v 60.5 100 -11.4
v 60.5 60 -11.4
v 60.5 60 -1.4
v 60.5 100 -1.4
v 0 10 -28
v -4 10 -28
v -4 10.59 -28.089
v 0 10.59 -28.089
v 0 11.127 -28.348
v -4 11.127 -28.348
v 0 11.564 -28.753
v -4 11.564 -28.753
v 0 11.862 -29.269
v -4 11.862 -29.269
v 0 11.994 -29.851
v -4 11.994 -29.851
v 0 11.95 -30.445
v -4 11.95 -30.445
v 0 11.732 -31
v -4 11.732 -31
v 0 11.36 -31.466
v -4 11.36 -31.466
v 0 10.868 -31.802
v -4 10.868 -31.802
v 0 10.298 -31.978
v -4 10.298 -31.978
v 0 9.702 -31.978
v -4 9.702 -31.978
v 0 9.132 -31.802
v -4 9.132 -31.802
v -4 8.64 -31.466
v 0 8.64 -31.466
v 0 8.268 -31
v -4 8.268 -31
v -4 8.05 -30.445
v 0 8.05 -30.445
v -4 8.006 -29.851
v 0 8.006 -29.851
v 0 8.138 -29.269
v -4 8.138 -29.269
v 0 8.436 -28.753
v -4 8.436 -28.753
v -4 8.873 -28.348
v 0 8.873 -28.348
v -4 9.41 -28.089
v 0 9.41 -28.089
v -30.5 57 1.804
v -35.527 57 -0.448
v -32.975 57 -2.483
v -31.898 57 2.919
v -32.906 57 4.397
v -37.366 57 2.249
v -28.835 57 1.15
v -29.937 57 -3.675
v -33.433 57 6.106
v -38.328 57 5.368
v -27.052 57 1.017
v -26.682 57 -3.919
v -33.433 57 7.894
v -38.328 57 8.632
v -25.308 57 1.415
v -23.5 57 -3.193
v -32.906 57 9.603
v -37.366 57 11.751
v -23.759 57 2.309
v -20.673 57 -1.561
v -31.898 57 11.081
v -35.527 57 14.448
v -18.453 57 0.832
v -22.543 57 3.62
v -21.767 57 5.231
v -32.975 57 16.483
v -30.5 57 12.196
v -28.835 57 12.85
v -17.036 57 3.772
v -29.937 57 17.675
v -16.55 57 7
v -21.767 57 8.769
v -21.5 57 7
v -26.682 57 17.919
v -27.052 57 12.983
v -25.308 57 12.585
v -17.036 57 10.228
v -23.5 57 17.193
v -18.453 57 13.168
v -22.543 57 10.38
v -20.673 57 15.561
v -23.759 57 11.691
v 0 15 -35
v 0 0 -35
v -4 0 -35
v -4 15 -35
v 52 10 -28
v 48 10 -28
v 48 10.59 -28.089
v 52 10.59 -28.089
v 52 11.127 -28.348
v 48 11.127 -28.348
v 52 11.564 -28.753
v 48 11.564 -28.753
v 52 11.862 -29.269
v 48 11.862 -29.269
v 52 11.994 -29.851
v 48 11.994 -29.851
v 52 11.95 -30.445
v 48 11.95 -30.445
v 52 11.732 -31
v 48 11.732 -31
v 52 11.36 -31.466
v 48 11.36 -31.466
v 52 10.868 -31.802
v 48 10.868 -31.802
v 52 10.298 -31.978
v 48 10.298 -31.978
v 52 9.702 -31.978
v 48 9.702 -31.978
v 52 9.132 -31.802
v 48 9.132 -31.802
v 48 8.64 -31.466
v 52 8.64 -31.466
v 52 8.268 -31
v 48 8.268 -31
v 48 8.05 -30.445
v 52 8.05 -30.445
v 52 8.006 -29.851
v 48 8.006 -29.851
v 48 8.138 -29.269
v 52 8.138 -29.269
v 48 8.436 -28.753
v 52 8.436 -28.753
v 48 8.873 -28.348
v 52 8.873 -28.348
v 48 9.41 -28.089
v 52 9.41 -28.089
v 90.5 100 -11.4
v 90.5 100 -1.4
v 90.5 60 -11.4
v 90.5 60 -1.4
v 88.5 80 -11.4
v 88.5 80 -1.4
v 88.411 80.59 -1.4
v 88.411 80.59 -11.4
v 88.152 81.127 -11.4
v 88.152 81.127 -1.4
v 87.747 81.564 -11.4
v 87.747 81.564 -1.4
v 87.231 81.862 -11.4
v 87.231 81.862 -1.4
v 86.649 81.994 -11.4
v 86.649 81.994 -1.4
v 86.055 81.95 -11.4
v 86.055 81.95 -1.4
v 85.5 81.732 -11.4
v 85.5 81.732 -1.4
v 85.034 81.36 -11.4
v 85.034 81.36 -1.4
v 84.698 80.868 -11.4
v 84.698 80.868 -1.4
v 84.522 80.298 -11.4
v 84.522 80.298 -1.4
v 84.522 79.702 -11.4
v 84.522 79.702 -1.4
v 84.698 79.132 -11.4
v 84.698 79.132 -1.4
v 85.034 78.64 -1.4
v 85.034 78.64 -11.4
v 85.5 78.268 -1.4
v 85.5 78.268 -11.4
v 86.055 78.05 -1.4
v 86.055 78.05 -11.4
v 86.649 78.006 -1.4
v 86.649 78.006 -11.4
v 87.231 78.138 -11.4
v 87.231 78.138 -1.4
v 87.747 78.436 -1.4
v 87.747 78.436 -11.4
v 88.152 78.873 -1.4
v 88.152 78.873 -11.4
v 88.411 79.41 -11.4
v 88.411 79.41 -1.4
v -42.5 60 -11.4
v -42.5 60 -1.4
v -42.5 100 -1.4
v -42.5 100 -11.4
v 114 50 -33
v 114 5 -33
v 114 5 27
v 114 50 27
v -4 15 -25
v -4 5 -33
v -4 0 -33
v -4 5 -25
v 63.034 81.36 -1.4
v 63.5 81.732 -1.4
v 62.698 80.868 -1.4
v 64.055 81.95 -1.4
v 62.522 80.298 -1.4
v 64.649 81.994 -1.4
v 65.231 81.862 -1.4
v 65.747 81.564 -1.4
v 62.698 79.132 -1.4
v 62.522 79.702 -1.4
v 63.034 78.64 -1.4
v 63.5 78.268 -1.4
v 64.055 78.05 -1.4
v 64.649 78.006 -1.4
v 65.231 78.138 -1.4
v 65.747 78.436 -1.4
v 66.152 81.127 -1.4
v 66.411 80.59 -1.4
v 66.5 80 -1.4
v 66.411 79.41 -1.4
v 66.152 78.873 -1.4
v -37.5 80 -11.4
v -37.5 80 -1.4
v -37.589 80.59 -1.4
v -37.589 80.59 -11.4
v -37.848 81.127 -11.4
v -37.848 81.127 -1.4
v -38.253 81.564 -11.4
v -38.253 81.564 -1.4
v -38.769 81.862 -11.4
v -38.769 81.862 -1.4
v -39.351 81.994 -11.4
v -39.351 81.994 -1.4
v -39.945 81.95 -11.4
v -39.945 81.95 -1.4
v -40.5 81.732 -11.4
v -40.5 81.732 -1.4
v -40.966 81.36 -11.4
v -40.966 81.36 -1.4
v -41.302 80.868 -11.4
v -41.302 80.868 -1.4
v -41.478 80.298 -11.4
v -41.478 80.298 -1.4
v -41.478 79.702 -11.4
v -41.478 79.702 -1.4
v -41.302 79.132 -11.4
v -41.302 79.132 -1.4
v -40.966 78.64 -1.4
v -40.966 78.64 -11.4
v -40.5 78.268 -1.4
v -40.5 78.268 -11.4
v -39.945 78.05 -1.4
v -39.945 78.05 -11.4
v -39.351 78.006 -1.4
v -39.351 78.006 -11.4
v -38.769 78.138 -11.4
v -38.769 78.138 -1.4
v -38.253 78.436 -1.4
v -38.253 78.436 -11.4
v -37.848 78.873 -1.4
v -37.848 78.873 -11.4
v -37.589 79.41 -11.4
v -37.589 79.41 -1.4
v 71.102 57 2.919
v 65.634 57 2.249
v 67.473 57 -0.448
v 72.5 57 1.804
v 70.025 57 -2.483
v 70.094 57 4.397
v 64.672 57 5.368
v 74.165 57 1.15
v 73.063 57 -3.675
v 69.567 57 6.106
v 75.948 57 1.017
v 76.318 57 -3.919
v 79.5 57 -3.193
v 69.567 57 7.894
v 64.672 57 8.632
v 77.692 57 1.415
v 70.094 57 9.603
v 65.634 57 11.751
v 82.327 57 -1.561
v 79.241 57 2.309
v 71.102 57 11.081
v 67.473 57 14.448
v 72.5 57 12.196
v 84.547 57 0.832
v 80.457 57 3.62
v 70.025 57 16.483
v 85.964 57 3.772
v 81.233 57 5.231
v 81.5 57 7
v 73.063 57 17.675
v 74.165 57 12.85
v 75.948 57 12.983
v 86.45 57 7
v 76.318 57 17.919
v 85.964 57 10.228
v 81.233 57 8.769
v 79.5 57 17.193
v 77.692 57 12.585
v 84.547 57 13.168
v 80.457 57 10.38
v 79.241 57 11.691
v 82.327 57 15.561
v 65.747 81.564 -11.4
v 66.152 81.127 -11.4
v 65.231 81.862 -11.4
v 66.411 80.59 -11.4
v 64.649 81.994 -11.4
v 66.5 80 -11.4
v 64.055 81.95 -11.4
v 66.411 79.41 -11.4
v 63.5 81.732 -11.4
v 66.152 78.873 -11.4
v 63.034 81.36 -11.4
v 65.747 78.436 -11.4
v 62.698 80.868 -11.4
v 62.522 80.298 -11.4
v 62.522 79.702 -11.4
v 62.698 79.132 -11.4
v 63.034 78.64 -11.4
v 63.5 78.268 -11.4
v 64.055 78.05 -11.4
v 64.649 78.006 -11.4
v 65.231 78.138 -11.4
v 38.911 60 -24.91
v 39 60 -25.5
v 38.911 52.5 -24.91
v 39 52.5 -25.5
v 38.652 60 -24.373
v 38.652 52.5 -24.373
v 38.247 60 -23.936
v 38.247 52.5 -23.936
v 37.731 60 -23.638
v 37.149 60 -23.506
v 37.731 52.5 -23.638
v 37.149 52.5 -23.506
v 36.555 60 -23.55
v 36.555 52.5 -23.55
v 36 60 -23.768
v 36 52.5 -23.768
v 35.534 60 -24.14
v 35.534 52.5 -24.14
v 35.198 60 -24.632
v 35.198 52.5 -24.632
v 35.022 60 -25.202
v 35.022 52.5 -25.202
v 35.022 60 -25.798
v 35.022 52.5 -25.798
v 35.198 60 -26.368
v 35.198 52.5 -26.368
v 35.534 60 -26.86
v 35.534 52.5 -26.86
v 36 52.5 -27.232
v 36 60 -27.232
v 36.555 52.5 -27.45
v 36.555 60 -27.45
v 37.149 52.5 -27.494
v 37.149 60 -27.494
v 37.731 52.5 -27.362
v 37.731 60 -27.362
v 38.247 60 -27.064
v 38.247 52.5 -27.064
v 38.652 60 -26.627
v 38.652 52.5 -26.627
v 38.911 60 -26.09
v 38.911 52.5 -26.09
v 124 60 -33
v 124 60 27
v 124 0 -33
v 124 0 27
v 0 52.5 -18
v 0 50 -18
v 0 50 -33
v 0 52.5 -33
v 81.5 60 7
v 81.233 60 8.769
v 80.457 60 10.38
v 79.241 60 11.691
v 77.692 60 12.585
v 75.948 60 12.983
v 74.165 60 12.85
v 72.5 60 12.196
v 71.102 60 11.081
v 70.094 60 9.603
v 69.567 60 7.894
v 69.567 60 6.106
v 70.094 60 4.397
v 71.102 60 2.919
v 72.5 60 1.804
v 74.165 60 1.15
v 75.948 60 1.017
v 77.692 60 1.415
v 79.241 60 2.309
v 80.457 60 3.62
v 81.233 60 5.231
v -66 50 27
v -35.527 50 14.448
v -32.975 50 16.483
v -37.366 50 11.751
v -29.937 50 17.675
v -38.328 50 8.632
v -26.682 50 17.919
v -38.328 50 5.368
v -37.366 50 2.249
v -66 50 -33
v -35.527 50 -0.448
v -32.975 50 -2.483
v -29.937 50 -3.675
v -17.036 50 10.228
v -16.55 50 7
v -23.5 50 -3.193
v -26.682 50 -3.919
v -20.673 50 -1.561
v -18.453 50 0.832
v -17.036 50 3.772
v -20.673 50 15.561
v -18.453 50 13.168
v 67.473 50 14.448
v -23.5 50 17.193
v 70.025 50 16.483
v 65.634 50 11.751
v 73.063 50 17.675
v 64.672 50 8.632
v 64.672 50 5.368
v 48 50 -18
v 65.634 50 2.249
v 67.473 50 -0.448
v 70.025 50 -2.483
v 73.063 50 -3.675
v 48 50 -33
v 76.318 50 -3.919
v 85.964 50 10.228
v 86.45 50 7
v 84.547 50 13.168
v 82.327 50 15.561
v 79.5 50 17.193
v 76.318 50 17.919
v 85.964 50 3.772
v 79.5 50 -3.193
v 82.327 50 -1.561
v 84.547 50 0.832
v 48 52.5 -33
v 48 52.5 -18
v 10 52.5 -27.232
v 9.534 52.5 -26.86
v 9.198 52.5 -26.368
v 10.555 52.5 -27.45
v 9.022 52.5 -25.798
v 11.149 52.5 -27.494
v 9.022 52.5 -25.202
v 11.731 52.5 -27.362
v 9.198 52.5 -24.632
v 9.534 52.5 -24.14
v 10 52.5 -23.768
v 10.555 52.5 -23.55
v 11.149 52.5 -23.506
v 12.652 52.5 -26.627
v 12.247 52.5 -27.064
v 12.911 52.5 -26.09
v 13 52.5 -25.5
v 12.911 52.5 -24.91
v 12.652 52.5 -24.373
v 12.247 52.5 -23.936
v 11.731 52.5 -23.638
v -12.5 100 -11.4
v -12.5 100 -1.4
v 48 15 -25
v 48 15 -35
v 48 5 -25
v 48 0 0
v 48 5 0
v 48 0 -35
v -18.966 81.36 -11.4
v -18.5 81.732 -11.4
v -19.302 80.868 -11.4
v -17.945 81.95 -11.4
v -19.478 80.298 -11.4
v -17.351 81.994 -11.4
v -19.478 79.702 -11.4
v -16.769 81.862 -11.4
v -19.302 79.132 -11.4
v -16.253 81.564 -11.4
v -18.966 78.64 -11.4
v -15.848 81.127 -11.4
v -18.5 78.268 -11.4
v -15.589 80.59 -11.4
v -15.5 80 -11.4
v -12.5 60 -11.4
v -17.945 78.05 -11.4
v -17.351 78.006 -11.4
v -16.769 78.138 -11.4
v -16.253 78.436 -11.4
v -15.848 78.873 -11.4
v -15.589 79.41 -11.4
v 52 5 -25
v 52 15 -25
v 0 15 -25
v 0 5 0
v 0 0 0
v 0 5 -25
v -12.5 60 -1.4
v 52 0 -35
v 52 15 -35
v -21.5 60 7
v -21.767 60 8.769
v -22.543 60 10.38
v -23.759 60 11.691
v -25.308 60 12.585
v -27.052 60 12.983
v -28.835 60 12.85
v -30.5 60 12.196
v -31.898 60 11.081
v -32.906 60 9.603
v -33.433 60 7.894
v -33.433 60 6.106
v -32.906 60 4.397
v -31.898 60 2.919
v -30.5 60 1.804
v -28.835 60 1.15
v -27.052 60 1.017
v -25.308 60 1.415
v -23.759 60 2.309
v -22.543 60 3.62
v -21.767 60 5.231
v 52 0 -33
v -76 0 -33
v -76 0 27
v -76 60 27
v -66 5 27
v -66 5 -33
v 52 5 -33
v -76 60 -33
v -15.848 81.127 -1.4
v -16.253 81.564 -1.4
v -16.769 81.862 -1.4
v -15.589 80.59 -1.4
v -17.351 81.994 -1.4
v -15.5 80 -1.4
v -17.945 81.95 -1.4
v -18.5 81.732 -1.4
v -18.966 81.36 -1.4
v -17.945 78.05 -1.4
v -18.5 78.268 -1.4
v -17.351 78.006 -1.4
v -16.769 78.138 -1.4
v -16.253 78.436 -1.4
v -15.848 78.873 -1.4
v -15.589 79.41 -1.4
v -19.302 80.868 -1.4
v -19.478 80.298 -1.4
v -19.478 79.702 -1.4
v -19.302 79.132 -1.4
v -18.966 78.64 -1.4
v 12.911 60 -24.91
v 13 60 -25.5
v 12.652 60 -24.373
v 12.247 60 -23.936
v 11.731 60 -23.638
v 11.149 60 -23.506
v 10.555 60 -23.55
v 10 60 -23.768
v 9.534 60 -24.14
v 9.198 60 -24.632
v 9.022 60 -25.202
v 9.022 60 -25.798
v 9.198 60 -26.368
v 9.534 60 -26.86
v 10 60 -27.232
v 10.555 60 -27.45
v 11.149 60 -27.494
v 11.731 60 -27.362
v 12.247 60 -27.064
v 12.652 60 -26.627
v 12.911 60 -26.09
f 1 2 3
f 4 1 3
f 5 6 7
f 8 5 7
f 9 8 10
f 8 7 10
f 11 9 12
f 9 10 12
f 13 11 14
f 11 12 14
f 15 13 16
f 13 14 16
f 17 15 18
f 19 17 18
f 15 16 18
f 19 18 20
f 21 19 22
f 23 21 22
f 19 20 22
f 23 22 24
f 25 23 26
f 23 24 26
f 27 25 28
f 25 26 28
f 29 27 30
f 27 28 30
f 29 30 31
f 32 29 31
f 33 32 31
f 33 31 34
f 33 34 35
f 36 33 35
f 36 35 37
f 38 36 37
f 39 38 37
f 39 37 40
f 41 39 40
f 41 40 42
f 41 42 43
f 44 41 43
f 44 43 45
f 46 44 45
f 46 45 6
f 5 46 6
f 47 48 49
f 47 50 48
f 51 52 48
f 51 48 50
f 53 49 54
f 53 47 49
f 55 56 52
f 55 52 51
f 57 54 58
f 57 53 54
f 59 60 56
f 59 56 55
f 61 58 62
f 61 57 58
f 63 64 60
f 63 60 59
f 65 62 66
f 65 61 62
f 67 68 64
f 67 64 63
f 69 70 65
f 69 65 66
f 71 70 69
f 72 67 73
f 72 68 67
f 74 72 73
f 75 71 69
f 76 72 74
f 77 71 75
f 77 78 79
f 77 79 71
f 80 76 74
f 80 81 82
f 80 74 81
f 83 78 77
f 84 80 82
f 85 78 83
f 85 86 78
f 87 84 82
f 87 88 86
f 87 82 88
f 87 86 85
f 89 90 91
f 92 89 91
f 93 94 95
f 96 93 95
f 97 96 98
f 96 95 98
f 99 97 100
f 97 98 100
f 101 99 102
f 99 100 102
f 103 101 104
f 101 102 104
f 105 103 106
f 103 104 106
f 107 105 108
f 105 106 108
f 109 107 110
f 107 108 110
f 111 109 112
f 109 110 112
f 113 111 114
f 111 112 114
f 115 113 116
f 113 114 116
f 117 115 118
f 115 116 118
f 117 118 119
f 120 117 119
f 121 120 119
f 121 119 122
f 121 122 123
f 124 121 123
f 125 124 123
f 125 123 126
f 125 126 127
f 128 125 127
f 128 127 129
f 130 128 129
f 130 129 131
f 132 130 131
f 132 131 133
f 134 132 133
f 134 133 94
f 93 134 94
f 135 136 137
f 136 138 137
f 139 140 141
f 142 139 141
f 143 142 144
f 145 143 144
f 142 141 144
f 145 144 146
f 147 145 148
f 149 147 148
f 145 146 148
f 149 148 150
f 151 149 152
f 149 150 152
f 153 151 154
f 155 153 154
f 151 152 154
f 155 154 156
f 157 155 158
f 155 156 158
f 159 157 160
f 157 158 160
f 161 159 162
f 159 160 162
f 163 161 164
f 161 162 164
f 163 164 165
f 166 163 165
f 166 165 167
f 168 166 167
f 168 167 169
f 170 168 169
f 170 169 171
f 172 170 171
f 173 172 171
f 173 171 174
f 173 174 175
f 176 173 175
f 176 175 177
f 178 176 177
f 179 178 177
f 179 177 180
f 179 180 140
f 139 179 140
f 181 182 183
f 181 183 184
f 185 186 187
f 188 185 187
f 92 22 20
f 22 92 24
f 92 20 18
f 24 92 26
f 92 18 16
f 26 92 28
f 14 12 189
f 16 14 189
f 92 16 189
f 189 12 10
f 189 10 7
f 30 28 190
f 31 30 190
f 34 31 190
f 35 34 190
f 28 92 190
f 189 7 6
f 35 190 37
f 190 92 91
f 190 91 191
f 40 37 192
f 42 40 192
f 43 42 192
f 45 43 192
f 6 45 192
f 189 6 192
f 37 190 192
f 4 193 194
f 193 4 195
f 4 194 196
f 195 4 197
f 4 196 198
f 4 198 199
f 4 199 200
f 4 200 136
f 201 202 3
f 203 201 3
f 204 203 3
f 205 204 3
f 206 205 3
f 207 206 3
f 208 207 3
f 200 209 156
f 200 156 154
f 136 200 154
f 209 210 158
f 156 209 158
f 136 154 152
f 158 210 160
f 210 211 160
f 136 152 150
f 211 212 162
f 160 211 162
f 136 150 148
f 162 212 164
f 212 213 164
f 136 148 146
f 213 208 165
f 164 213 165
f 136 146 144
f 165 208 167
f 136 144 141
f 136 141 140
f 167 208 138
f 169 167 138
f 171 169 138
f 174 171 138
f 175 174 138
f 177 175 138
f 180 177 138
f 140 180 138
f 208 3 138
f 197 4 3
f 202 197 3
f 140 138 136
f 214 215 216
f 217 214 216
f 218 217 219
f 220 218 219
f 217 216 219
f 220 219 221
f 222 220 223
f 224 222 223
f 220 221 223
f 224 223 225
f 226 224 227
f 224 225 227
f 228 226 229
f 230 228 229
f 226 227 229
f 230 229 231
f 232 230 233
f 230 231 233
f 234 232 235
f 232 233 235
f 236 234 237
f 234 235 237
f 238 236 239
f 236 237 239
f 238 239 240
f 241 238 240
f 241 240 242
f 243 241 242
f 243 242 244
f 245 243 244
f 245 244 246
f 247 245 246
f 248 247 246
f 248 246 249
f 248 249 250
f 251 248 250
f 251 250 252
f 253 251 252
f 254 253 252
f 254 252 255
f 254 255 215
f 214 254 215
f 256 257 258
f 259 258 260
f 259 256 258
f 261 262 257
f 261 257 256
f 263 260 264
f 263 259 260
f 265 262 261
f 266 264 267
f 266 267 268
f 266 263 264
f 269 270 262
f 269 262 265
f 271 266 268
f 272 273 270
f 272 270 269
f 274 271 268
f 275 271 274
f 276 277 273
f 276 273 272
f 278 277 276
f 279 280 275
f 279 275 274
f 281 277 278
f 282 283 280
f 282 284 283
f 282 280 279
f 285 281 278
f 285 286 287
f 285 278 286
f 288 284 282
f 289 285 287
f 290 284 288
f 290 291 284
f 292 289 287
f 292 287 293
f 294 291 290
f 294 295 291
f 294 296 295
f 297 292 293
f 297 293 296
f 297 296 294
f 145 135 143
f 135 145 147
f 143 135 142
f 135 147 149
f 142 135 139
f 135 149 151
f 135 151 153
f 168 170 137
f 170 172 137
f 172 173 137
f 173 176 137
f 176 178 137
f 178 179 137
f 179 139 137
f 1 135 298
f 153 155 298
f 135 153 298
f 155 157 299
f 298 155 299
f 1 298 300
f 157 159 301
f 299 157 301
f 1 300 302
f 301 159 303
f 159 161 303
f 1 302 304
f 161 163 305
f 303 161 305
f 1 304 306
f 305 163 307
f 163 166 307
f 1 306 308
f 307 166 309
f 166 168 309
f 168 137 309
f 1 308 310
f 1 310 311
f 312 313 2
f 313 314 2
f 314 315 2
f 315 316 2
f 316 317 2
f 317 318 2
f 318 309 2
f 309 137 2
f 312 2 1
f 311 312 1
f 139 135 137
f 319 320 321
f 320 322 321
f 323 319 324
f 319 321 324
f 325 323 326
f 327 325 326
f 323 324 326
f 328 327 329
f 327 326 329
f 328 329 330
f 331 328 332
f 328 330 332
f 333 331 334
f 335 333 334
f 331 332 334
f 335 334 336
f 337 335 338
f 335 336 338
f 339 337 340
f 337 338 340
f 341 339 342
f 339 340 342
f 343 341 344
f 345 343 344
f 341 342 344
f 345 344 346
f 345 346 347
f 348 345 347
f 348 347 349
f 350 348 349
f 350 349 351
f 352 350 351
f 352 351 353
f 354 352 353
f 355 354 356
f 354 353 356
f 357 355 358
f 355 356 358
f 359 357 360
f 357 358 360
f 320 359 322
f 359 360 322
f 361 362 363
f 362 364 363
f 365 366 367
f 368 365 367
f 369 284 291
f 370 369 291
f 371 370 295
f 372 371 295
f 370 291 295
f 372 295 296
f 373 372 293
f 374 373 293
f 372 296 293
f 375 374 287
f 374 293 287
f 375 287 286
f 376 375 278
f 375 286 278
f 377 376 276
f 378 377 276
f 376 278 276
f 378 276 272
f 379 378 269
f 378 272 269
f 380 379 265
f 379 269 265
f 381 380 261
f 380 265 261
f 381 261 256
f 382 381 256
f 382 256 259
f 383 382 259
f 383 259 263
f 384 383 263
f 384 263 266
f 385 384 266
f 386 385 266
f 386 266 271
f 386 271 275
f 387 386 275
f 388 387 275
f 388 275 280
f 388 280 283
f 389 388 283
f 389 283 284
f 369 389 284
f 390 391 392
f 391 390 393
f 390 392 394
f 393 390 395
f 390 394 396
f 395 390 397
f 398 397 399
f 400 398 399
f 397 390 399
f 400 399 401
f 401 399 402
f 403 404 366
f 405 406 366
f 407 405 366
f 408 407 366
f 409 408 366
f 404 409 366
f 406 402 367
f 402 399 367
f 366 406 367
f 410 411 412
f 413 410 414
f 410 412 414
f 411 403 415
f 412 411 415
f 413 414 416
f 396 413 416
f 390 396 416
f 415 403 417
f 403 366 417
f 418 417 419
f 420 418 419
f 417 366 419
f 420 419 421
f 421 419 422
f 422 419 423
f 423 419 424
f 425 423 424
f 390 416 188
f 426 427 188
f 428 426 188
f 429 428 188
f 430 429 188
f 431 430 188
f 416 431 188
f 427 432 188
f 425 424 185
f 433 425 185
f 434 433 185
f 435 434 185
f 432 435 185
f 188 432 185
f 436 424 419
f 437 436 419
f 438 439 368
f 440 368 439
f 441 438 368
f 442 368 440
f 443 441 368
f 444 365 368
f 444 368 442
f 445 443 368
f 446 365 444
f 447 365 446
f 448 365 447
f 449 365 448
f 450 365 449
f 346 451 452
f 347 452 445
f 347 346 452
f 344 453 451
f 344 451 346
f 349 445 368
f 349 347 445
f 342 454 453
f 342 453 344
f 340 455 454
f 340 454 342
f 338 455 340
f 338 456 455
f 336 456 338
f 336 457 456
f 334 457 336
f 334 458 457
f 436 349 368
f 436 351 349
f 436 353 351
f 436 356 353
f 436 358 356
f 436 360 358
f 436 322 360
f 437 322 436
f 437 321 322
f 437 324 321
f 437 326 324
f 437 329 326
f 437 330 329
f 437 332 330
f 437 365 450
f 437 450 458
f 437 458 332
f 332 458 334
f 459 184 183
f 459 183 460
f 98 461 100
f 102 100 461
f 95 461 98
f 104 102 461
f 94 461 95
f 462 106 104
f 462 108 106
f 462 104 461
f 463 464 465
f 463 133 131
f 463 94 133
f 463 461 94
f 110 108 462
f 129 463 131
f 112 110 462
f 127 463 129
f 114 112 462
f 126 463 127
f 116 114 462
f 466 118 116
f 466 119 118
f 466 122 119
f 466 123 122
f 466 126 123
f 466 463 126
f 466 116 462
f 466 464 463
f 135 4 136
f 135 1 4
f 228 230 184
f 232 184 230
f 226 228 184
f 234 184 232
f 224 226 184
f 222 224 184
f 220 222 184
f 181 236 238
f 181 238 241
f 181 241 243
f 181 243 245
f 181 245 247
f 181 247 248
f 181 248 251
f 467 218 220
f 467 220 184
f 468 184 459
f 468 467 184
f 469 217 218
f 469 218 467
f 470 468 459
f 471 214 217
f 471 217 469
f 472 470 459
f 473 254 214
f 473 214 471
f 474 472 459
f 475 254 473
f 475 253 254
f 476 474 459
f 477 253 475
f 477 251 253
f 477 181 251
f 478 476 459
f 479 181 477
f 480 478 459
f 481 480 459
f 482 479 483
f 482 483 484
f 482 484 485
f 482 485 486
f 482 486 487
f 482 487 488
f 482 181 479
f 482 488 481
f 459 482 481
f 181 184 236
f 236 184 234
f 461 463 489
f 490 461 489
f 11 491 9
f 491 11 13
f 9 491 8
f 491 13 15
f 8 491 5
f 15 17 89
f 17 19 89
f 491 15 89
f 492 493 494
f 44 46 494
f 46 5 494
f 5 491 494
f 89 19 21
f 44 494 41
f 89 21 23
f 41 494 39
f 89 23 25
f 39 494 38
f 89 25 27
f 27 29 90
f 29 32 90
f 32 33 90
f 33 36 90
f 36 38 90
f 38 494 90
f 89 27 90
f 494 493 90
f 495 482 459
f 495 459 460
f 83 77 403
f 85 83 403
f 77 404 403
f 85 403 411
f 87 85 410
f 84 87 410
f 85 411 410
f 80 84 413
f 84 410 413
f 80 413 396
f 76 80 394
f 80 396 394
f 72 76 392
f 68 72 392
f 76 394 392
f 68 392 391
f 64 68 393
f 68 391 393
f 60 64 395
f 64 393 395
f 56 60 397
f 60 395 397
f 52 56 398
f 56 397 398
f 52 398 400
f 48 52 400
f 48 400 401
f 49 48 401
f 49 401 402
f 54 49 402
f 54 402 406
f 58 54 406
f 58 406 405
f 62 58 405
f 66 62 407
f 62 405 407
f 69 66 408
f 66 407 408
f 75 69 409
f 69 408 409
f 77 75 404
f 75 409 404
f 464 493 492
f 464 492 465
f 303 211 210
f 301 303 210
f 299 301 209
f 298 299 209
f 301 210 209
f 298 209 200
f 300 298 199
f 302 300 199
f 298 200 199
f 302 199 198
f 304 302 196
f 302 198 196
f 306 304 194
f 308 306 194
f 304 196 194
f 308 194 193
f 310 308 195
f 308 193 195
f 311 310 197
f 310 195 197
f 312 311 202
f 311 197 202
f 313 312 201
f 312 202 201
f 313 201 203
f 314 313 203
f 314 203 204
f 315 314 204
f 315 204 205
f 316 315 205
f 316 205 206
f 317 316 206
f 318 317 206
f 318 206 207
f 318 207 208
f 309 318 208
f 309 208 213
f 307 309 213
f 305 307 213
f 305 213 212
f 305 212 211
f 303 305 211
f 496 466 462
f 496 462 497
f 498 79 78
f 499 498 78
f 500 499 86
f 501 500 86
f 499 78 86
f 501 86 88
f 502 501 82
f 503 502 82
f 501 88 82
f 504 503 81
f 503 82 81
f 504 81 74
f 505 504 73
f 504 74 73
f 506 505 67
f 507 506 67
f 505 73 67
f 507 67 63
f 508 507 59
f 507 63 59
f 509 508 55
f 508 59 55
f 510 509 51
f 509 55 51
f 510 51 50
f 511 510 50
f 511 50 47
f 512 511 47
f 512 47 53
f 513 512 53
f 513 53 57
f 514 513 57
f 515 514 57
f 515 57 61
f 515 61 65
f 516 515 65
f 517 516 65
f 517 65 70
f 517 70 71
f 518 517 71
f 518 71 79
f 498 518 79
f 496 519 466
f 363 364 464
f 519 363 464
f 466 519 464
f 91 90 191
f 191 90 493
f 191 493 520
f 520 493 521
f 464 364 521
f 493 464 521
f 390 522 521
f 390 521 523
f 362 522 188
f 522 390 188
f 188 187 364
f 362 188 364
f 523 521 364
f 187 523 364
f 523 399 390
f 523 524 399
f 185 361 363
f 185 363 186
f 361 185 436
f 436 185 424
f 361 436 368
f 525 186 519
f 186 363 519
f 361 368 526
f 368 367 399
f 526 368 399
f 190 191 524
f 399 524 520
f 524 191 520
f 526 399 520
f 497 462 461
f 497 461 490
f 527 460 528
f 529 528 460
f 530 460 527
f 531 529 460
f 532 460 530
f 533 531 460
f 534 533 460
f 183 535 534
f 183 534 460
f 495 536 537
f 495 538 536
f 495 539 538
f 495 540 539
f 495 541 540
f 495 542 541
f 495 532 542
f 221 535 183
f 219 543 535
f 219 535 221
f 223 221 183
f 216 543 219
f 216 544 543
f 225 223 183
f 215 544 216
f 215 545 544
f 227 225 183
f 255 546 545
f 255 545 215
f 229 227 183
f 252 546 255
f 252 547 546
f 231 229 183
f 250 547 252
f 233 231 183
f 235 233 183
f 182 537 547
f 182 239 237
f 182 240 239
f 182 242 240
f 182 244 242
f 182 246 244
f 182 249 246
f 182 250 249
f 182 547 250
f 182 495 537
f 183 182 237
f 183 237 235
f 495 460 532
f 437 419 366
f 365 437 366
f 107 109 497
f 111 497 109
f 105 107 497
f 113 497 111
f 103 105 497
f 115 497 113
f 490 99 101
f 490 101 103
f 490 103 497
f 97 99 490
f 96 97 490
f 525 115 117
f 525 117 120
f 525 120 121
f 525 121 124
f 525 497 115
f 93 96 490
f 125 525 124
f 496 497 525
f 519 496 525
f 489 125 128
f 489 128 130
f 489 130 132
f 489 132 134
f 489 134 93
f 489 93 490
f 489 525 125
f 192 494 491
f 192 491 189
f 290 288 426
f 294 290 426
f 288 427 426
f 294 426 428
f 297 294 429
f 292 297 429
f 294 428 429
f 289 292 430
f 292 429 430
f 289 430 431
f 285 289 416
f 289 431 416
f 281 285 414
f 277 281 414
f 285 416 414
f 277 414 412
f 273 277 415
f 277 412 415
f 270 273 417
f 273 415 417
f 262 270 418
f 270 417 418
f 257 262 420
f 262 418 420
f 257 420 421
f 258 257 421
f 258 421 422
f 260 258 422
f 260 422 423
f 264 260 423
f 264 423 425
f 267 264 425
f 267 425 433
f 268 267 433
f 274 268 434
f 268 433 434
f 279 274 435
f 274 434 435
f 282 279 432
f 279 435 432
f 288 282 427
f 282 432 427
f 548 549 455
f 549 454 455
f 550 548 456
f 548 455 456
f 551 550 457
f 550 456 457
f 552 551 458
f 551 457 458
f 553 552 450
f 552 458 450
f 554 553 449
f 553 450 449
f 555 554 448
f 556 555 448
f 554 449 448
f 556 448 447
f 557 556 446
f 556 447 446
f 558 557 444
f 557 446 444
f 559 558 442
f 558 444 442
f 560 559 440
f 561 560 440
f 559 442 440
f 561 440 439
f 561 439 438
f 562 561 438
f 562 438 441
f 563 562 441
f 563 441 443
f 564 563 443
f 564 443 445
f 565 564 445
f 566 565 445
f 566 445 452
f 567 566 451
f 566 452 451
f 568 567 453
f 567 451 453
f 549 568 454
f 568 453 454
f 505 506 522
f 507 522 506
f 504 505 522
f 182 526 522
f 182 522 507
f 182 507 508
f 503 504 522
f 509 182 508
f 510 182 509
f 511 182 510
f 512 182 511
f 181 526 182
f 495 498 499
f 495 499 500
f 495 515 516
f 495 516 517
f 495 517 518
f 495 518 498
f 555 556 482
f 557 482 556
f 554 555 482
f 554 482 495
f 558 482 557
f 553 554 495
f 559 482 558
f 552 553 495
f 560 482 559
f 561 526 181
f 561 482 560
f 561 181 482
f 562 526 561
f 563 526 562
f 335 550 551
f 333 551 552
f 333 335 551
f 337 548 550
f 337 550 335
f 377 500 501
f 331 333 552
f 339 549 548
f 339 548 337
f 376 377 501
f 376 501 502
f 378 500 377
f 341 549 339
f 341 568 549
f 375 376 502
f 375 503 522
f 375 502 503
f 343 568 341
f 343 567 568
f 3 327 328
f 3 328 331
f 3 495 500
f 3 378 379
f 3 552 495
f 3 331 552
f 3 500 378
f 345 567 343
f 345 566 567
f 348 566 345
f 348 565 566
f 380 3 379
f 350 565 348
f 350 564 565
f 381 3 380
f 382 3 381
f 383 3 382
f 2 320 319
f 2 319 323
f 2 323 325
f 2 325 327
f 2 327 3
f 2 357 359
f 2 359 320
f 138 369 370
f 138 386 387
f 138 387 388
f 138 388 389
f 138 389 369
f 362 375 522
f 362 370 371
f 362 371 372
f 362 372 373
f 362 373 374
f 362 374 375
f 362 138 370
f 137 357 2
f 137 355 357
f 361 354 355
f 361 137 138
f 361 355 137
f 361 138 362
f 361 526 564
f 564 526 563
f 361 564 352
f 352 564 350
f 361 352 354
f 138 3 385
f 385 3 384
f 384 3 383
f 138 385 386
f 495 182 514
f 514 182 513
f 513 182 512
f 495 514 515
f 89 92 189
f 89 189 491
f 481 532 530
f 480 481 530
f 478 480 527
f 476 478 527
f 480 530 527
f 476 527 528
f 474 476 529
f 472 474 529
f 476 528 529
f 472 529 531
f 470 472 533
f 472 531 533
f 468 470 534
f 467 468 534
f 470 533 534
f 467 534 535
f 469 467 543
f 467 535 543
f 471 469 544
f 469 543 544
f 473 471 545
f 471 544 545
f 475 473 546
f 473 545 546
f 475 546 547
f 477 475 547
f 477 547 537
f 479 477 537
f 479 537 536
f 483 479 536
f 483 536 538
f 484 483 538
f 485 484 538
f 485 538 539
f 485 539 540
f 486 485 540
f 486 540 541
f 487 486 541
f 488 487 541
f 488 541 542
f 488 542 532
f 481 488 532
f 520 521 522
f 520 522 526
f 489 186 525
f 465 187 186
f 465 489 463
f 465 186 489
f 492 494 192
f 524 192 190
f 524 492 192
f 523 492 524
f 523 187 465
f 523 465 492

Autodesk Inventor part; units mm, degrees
ref_plane "YZ Plane" through (0, 0, 0) normal (1, 0, 0) x (0, 1, 0)
ref_plane "XZ Plane" through (0, 0, 0) normal (0, 1, 0) x (-1, 0, 0)
ref_plane "XY Plane" through (0, 0, 0) normal (0, 0, 1) x (1, 0, 0)
sketch "Sketch1" plane through (0, 0, 0) normal (0, 1, 0) x (-1, 0, 0)
  line L0 (0, -35) -> (4, -35)
  line L1 (-48, 0) -> (-48, -35)
  line L2 (-48, -24.7754) -> (-48, -13.3333)
  line L3 (-48, -35) -> (-52, -35)
  line L4 (-52, -35) -> (-52, -33)
  line L5 (-52, -33) -> (-124, -33)
  line L6 (4, -35) -> (4, -33)
  line L7 (4, -33) -> (76, -33)
  line L8 (0, 0) -> (0, -35)
  line L9 (0, -96.6) -> (0, 47.6) projected
  line L10 (0, 0) -> (-48, 0)
  line L11 (76, -33) -> (76, 27)
  line L12 (76, 27) -> (-124, 27)
  line L13 (-124, 27) -> (-124, -33)
  line L14 (-24, 27) -> (-24, -76) construction
  dimension "d0" = 35
  dimension "d1" = 35
  dimension "d3" = 4
  dimension "d4" = 2
  dimension "d6" = 48
  dimension "d13" = 60
  dimension "d20" = 100
extrude "Extrusion1" add sketch "Sketch1" along normal blind 5
sketch "Sketch2" plane through (0, 5, 0) normal (0, 1, 0) x (1, 0, 0)
  line L0 (-4, 35) -> (-4, 33) projected
  line L1 (0, 0) -> (0, 35) projected
  line L2 (-4, 35) -> (0, 35)
  line L3 (0, 35) -> (0, 25)
  line L4 (0, 25) -> (-4, 25)
  line L5 (-4, 25) -> (-4, 35)
  line L6 (52, 35) -> (48, 35) projected
  line L7 (52, 35) -> (48, 35)
  line L8 (48, 35) -> (48, 25)
  line L9 (48, 25) -> (52, 25)
  line L10 (52, 25) -> (52, 35)
  dimension "d21" = 10
  dimension "d22" = 10
extrude "Extrusion2" add sketch "Sketch2" along normal blind 10
sketch "Sketch3" plane through (-4, 0, -35) normal (-1, 0, 0) x (0, 0, 1)
  circle A0 centre (5, 10) radius 2
  line L0 (0, 0) -> (0, 15) projected
  line L1 (0, 15) -> (10, 15) projected
  point P0 (35, 0)
  dimension "d25" = 4
  dimension "d26" = 5
  dimension "d27" = 5
extrude "Extrusion3" cut sketch "Sketch3" against normal through all
sketch "Sketch7" plane through (0, 5, 0) normal (0, 1, 0) x (1, 0, 0)
  line L0 (-4, 33) -> (-76, 33) projected
  line L1 (-76, -27) -> (124, -27) projected
  line L2 (-76, 33) -> (-66, 33)
  line L3 (-66, 33) -> (-66, -27)
  line L4 (-66, -27) -> (-76, -27)
  line L5 (-76, -27) -> (-76, 33)
  line L6 (124, 33) -> (114, 33)
  line L7 (114, 33) -> (114, -27)
  line L8 (114, -27) -> (124, -27)
  line L9 (124, -27) -> (124, 33)
  point P0 (0, 0)
  dimension "d42" = 10
  dimension "d43" = 10
  dimension "d67" = 190
extrude "Extrusion7" add sketch "Sketch7" along normal blind 45
sketch "Sketch8" plane through (0, 50, 0) normal (0, 1, 0) x (1, 0, 0)
  line L0 (-76, -27) -> (-76, 33)
  line L1 (124, -27) -> (124, 33) projected
  line L2 (-76, -27) -> (124, -27)
  line L3 (124, -27) -> (124, 33)
  line L4 (124, 33) -> (-76, 33)
  line L5 (-76, 33) -> (-76, -27)
extrude "Extrusion8" add sketch "Sketch8" along normal blind 10
sketch "Sketch9" plane through (0, 50, 0) normal (0, -1, 0) x (1, 0, 0)
  line L0 (48, -35) -> (48, -25) projected
  line L1 (0, 0) -> (0, -35) projected
  line L2 (0, -33) -> (48, -33)
  line L3 (48, -33) -> (48, -18)
  line L4 (48, -18) -> (0, -18)
  line L5 (0, -18) -> (0, -33)
  dimension "d50" = 15
extrude "Extrusion9" cut sketch "Sketch9" against normal blind 2.5
sketch "Sketch10" plane through (0, 52.5, 0) normal (0, -1, 0) x (1, 0, 0)
  line L0 (0, -25.5) -> (11, -25.5)
  line L1 (0, 0) -> (0, -35) projected
  circle A0 centre (11, -25.5) radius 2
  line L2 (48, -18) -> (48, -33) projected
  line L3 (48, -25.5) -> (37, -25.5)
  circle A1 centre (37, -25.5) radius 2
  line L4 (48, -33) -> (0, -33) projected
  dimension "d55" = 11
  dimension "d57" = 4
  dimension "d58" = 11
  dimension "d68" = 7.5
extrude "Extrusion10" cut sketch "Sketch10" against normal through all
sketch "Sketch12" plane through (0, 50, 0) normal (0, -1, 0) x (1, 0, 0)
  circle A0 centre (-27.5, 7) radius 10.95
  circle A1 centre (75.5, 7) radius 10.95
  point P0 (0, 0)
  dimension "d64" = 21.9
extrude "Extrusion12" cut sketch "Sketch12" against normal blind 7
sketch "Sketch16" plane through (-27.5, 57, 7) normal (0, -1, 0) x (1, 0, 0)
  circle A0 centre (0, 0) radius 6
  circle A1 centre (103, 0) radius 10.95 projected
  circle A2 centre (103, 0) radius 6
  point P0 (27.5, -7)
  dimension "d88" = 12
extrude "Extrusion15" cut sketch "Sketch16" against normal through all contours A0 | A2
sketch "Sketch17" plane through (0, 60, 0) normal (0, 1, 0) x (1, 0, 0)
  circle A0 centre (75.5, -7) radius 6 projected
  line L0 (75.5, -7) -> (75.5, 1.4)
  line L1 (60.5, 1.4) -> (90.5, 1.4)
  line L2 (90.5, 1.4) -> (90.5, 11.4)
  line L3 (90.5, 11.4) -> (60.5, 11.4)
  line L4 (60.5, 11.4) -> (60.5, 1.4)
  circle A1 centre (75.5, -7) radius 10.95 projected
  circle A2 centre (-27.5, -7) radius 6 projected
  line L5 (75.5, -7) -> (-27.5, -7)
  line L6 (24, -7) -> (24, -1)
  line L7 (-12.5, 1.4) -> (-42.5, 1.4)
  line L8 (-42.5, 1.4) -> (-42.5, 11.4)
  line L9 (-42.5, 11.4) -> (-12.5, 11.4)
  line L10 (-12.5, 11.4) -> (-12.5, 1.4)
  point P0 (0, 0)
  dimension "d91" = 8.4
  dimension "d92" = 30
  dimension "d93" = 10
extrude "Extrusion16" add sketch "Sketch17" along normal blind 40 contours L1 A1 | L1 L4 L3 L2 A1 | L7 L8 L9 L10
sketch "Sketch18" plane through (60.5, 60, -1.4) normal (0, 0, 1) x (1, 0, 0)
  circle A0 centre (4, 20) radius 2
  line L0 (-136.5, 0) -> (63.5, 0) projected
  line L1 (0, 0) -> (0, 40) projected
  line L2 (0, 0) -> (30, 0)
  line L3 (15, 0) -> (15, 6)
  circle A1 centre (26, 20) radius 2
  point P0 (-60.5, -60)
  dimension "d96" = 20
  dimension "d97" = 4
  dimension "d98" = 4
extrude "Extrusion17" cut sketch "Sketch18" against normal through all
sketch "Sketch19" plane through (-42.5, 60, -1.4) normal (0, 0, 1) x (1, 0, 0)
  line L0 (-33.5, 0) -> (166.5, 0) projected
  line L1 (133, 0) -> (-1, 0)
  line L2 (66, 0) -> (66, 10)
  circle A0 centre (107, 20) radius 2 projected
  circle A1 centre (107, 20) radius 2
  circle A2 centre (129, 20) radius 2 projected
  circle A3 centre (129, 20) radius 2
  circle A4 centre (25, 20) radius 2
  circle A5 centre (3, 20) radius 2
  point P0 (42.5, -60)
extrude "Extrusion18" cut sketch "Sketch19" against normal through all contours A4 | A5
equation "\"d1\" = d0"
properties part number "upper part shooter_3DPrint"
